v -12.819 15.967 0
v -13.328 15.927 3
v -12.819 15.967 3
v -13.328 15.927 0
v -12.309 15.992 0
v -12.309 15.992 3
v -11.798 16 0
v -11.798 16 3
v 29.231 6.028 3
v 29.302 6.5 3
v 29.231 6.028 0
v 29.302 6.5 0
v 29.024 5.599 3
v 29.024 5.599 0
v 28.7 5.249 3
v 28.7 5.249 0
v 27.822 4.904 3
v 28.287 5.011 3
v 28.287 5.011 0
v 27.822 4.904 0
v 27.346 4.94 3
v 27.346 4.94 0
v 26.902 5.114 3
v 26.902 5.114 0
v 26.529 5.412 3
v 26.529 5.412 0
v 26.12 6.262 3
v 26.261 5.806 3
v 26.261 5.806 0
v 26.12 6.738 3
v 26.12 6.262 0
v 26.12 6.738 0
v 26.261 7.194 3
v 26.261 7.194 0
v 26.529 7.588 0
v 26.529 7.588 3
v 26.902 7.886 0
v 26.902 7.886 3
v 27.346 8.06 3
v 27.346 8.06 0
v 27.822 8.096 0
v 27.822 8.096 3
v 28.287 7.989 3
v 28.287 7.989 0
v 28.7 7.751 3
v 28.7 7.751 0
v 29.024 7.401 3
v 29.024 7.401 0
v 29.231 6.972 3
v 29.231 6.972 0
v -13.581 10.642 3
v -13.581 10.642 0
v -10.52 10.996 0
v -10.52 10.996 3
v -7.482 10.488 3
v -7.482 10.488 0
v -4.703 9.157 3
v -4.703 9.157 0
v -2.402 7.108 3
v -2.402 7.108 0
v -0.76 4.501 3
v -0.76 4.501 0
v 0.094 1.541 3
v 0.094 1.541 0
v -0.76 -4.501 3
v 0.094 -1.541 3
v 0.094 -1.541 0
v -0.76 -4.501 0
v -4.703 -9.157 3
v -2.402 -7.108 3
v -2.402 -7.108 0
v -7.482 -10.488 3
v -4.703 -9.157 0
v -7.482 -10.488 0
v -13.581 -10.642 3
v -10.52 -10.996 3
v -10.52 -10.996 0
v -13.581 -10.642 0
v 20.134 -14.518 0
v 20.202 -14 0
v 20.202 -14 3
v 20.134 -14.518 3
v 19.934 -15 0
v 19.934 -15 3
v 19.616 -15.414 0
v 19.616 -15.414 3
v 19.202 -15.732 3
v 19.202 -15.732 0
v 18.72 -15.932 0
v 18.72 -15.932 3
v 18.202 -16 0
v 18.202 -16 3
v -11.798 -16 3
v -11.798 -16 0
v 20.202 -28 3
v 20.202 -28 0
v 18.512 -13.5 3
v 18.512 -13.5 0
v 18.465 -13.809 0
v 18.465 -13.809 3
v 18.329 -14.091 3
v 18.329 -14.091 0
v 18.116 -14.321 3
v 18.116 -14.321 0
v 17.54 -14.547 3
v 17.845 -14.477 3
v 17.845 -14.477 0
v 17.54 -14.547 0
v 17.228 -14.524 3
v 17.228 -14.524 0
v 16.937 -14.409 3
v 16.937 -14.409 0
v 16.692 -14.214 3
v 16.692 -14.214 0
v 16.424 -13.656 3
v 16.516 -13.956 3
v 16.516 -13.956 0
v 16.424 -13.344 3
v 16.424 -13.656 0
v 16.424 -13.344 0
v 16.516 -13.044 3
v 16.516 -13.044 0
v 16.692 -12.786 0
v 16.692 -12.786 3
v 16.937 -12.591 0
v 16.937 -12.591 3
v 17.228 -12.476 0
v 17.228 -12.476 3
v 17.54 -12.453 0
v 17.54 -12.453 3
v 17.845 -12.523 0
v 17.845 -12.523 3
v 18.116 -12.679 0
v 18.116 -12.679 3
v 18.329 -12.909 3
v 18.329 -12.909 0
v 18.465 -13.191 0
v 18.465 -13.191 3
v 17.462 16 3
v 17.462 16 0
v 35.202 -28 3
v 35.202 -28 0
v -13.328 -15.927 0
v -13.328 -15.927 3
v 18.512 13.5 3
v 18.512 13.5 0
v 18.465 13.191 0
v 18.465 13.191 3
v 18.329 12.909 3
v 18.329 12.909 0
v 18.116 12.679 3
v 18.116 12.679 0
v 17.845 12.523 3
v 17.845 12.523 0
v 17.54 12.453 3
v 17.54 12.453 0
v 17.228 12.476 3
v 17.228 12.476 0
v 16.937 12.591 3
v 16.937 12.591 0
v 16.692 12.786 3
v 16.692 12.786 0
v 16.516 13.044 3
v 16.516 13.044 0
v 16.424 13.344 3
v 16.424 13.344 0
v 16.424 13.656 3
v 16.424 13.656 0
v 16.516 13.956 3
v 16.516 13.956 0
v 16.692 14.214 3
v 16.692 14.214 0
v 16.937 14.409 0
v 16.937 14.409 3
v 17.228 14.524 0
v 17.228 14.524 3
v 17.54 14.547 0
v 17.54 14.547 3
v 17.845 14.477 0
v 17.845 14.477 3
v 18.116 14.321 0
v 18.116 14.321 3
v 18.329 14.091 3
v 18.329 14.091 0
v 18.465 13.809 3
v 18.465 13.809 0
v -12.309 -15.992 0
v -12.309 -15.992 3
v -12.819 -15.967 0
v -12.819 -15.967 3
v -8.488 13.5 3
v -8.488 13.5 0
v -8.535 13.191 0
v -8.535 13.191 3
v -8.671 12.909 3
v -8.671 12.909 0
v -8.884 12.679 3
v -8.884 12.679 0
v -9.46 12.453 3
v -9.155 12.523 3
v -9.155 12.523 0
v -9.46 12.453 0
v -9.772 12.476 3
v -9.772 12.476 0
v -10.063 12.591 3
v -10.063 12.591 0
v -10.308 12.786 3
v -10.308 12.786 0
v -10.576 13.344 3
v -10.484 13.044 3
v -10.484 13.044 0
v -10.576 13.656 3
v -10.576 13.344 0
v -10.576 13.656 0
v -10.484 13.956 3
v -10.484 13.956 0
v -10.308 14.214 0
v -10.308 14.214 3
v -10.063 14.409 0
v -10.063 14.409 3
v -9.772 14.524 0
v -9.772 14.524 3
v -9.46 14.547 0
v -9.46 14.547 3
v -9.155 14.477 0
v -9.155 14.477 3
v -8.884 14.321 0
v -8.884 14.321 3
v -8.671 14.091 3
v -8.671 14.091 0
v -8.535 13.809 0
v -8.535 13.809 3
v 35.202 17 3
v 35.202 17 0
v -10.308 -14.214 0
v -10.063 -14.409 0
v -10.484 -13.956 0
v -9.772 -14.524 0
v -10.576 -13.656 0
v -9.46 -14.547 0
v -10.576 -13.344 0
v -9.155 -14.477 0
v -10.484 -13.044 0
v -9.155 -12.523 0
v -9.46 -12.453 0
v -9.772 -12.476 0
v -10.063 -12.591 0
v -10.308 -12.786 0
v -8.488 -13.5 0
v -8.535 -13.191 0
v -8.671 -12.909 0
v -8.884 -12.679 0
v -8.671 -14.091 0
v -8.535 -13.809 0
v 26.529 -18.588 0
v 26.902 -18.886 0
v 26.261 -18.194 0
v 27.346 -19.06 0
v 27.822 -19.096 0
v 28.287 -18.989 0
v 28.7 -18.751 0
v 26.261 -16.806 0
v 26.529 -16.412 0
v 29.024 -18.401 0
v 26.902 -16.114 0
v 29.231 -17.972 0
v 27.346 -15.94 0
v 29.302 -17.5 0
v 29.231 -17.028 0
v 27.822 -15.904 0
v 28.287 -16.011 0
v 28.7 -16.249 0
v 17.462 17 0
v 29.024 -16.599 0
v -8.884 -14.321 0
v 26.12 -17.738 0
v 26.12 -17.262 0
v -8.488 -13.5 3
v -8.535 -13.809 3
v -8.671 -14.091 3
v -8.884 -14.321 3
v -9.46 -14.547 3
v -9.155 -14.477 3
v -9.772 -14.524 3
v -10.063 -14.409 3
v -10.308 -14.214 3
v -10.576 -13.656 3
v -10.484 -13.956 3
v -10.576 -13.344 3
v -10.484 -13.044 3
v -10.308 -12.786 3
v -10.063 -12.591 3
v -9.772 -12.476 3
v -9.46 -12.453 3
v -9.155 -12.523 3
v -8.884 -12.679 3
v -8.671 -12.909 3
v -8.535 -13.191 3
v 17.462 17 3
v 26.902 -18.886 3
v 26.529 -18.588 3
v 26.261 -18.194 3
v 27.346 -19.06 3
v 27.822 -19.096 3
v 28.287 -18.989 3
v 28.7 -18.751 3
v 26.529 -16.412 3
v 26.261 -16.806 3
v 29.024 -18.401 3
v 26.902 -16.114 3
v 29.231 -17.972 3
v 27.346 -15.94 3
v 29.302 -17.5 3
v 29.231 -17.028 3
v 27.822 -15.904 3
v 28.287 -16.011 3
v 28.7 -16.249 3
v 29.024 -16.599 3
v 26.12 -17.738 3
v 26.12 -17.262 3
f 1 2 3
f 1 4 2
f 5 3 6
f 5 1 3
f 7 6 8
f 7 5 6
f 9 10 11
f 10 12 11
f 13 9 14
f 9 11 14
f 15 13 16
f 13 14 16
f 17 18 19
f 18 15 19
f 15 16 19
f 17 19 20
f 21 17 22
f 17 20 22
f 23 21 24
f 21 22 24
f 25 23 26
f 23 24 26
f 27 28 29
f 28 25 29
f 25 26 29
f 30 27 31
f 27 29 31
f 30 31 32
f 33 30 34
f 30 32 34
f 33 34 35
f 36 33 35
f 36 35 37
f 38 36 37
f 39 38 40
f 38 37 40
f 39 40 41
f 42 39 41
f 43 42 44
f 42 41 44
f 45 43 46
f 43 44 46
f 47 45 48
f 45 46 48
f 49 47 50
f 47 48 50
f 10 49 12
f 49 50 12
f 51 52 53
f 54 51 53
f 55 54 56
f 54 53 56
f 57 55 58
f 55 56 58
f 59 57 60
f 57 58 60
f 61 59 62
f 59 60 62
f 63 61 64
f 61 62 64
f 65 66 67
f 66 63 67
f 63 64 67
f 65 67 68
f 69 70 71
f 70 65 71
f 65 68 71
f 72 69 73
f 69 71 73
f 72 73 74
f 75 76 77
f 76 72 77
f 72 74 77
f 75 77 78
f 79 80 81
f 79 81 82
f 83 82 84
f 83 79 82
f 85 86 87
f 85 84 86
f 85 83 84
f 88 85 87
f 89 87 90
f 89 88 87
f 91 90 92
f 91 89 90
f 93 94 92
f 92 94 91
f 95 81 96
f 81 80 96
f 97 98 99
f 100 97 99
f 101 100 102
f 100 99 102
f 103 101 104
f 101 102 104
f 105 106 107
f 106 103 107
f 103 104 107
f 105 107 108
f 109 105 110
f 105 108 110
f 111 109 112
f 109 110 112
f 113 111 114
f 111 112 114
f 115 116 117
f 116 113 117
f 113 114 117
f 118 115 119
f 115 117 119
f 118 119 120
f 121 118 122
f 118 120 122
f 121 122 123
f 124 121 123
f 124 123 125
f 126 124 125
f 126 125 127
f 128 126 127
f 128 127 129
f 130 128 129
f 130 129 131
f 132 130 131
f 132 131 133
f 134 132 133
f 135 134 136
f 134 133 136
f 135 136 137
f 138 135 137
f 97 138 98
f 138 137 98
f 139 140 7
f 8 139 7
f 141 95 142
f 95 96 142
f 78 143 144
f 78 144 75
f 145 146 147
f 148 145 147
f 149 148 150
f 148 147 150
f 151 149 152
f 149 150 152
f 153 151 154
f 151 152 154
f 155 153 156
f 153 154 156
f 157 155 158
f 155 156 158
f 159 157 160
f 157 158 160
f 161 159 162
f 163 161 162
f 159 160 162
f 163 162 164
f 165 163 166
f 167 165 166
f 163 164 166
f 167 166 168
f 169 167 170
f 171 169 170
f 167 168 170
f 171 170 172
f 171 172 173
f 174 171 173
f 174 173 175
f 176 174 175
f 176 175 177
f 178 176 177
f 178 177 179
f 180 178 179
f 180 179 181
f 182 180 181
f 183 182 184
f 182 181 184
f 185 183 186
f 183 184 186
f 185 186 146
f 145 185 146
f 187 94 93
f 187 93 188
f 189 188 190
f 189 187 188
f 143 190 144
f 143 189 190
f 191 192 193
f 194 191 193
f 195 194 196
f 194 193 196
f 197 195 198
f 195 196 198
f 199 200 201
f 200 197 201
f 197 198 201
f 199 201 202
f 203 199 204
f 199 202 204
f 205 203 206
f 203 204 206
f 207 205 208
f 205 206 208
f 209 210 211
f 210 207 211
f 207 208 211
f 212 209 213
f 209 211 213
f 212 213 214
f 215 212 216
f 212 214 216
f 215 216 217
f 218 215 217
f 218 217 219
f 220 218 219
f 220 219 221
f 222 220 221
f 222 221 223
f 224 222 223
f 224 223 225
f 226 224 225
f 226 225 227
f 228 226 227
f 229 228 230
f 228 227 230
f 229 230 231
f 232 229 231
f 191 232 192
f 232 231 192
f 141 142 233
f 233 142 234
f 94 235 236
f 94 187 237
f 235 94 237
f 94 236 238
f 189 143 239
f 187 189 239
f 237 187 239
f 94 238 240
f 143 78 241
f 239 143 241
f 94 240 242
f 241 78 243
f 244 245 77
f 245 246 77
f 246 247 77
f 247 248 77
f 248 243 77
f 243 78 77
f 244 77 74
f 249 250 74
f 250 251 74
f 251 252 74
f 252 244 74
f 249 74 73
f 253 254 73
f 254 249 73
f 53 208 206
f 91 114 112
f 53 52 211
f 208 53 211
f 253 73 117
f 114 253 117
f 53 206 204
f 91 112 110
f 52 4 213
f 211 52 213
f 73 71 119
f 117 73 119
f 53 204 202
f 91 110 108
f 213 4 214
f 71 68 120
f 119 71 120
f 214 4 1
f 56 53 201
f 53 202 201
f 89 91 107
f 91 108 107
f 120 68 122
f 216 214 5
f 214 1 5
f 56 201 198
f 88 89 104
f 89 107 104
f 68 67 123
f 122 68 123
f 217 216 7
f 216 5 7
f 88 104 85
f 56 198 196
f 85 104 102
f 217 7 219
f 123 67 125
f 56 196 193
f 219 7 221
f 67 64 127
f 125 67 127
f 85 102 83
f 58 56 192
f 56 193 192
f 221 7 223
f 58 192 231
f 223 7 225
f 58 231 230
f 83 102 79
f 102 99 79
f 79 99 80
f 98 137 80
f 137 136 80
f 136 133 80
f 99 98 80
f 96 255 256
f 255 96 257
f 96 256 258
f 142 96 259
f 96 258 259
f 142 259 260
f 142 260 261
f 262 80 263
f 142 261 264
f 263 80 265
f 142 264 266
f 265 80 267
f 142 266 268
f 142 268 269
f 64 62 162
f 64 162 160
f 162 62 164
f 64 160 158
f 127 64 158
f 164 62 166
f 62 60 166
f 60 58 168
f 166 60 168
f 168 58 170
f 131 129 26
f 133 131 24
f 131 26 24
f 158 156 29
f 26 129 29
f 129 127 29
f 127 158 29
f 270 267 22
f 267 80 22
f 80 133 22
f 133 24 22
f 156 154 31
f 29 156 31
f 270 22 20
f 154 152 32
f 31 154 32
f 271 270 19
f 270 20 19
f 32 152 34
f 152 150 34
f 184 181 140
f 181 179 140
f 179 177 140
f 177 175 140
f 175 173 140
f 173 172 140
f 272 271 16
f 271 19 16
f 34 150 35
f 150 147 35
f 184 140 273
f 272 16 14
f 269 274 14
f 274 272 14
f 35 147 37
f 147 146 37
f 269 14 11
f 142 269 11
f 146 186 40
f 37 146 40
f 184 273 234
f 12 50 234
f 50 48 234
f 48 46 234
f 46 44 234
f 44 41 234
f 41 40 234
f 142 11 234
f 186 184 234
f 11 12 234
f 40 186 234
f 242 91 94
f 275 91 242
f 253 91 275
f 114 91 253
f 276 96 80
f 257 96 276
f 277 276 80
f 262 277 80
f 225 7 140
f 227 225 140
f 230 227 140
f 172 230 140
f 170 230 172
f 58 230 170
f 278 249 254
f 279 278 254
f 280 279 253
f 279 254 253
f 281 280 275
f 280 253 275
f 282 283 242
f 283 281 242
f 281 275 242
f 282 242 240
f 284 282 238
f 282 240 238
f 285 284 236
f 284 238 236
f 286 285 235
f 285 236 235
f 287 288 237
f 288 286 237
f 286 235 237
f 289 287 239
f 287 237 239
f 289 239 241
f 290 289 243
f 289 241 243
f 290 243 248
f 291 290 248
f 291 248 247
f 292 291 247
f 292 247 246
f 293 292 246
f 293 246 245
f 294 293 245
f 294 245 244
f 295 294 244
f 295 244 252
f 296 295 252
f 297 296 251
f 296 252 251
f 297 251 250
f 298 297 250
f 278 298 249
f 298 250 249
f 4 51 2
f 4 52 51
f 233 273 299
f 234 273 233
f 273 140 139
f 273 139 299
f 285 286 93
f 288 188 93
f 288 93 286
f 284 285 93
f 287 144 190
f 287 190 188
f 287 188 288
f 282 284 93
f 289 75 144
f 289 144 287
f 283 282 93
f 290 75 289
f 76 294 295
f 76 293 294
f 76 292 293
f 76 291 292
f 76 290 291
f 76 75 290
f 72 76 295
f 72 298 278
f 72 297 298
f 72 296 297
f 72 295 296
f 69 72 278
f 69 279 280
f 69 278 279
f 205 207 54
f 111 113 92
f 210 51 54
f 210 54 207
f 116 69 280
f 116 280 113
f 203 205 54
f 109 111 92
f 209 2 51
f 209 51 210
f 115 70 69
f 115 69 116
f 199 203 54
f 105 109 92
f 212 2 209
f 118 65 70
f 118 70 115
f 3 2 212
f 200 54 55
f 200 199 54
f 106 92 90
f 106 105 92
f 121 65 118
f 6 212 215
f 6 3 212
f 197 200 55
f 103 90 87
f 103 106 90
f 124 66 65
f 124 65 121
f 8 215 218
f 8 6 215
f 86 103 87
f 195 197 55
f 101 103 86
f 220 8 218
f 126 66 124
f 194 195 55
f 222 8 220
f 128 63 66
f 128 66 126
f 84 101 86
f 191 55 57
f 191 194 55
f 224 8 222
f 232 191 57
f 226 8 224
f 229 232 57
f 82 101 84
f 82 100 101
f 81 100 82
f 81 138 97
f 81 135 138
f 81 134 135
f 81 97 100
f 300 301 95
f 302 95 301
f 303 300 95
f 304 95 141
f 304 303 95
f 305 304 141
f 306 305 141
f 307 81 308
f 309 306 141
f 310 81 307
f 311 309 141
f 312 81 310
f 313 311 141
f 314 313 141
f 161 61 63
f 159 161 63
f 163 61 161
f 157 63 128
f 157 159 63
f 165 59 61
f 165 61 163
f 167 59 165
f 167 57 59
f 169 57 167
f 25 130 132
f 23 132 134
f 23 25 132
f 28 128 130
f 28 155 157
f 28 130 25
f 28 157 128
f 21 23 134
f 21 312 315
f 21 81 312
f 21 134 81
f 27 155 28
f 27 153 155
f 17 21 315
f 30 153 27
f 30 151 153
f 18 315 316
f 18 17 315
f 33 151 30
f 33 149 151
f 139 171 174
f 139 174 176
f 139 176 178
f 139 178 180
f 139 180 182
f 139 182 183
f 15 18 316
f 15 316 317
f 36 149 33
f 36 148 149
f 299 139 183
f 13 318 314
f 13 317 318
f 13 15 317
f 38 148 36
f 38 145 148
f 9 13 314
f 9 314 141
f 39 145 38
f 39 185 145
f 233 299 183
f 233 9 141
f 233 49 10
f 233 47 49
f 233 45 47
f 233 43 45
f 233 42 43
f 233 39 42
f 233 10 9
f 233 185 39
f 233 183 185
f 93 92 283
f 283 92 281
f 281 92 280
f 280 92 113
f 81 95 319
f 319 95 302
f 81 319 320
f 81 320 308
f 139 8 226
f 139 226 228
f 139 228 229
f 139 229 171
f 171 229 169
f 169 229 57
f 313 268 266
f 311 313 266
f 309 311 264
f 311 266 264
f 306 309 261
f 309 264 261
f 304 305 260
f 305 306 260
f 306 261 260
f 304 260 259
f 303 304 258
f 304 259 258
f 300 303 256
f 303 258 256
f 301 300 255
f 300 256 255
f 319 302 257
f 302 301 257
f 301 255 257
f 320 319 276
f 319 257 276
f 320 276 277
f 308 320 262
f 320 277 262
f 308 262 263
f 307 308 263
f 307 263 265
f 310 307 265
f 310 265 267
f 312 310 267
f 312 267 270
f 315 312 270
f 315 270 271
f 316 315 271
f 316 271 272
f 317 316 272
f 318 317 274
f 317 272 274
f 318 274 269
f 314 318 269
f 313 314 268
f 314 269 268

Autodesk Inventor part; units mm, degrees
ref_plane "YZ Plane" through (0, 0, 0) normal (1, 0, 0) x (0, 1, 0)
ref_plane "XZ Plane" through (0, 0, 0) normal (0, 1, 0) x (-1, 0, 0)
ref_plane "XY Plane" through (0, 0, 0) normal (0, 0, 1) x (1, 0, 0)
sketch "スケッチ1" plane through (0, 0, 0) normal (0, 0, 1) x (1, 0, 0)
  circle A0 centre (-18.2979, -11.3675) radius 1.05 construction
  circle A1 centre (-0.7979, 13.5) radius 1.05 construction
  circle A2 centre (12.2021, -13.5) radius 1.05 construction
  circle A3 centre (-18.2979, 10.6325) radius 1.05 construction
  circle A4 centre (-10.7975, 0) radius 1.3 construction
  circle A5 centre (-9.5382, 13.5) radius 1.05 projected
  circle A6 centre (-9.5382, -13.5) radius 1.05 projected
  circle A7 centre (17.4618, 13.5) radius 1.05 projected
  circle A8 centre (17.4618, -13.5) radius 1.05 projected
  line L0 (-11.7979, -16) -> (18.2021, -16) projected
  arc A9 (18.2021, -16) -> (20.2021, -14) centre (18.2021, -14) ccw projected
  line L1 (20.2021, -14) -> (20.2021, 14) projected
  arc A10 (20.2021, 14) -> (18.2021, 16) centre (18.2021, 14) ccw projected
  line L2 (18.2021, 16) -> (-11.7979, 16) projected
  line L3 (-22.7979, 0) -> (0, 0) construction
  line L4 (0, 0) -> (13.5202, -23.4176) construction
  line L5 (-22.7979, 0) -> (-32.6431, 0) construction
  line L6 (9.2376, -16) -> (3.5384, -19.2904) construction
  line L7 (11.7376, -20.3301) -> (14.3357, -18.8301) construction
  line L8 (9.2376, 16) -> (3.5384, 19.2904) construction
  line L9 (11.7376, 20.3301) -> (14.3357, 18.8301) construction
  circle A11 centre (17.4618, -13.5) radius 2.5 construction
  circle A12 centre (17.4618, 13.5) radius 2.5 construction
  line L10 (3.6668, -16) -> (18.2021, -16)
  arc A13 (18.2021, -16) -> (20.2021, -14) centre (18.2021, -14) ccw
  line L11 (3.6668, 16) -> (18.2021, 16)
  arc A14 (20.2021, 14) -> (18.2021, 16) centre (18.2021, 14) ccw
  line L12 (-5.7966, 16) -> (-11.7979, 16)
  arc A15 (-11.7979, 16) -> (-13.3279, 15.9267) centre (-11.7979, 0) ccw
  line L13 (-5.7966, -16) -> (-11.7979, -16)
  arc A16 (-13.3279, -15.9267) -> (-11.7979, -16) centre (-11.7979, 0) ccw
  arc A17 (-13.5809, -10.642) -> (-13.5809, 10.642) centre (-10.7975, 0) ccw
  line L14 (-13.3279, -15.9267) -> (-13.5809, -10.642)
  line L15 (-13.5809, 10.642) -> (-13.3279, 15.9267)
  line L16 (20.2021, 0) -> (35.2021, 0) construction
  line L17 (20.2021, -22.5) -> (20.2021, -17.0694)
  line L18 (20.2021, -9.9306) -> (20.2021, 9.9306)
  line L19 (20.2021, 0) -> (35.2021, 0)
  line L20 (20.2021, -17.0694) -> (20.2021, -14)
  line L21 (17.4618, 17) -> (35.2021, 17)
  line L22 (20.2021, 14) -> (20.2021, -28)
  line L23 (20.2021, 17) -> (65.2021, 17) construction
  line L24 (20.2021, -28) -> (35.2021, -28)
  line L25 (35.2021, -28) -> (35.2021, 17)
  line L26 (27.7021, -28) -> (27.7021, 17) construction
  line L27 (27.7021, -5.5) -> (20.2021, -5.5) construction
  circle A18 centre (27.7021, -17.5) radius 1.6
  circle A19 centre (27.7021, 6.5) radius 1.6
  line L28 (17.4618, 13.5) -> (17.4618, 14.55)
  line L29 (17.4618, 16) -> (17.4618, 17)
  point P0 (-22.7979, -6.4363)
  point P1 (15.7302, -16)
  point P2 (13.5202, 23.4176)
  point P3 (15.7302, 16)
  dimension "d0" = 120
  dimension "d7" = 5
  dimension "d10" = 5
  dimension "d24" = 22
  dimension "d28" = 15
  dimension "d38" = 3.5
  dimension "d39" = 45
  dimension "d40" = 90
  dimension "d41" = 15
  dimension "d42" = 2.7403
  dimension "d43" = 3.2
  dimension "d44" = 12
extrude "押し出し5" add sketch "スケッチ1" along normal blind 3
properties part number "デュアルサーボつなぎフレーム_アルミ(A2017)_t1.5" material "アルミニウム 6061"
